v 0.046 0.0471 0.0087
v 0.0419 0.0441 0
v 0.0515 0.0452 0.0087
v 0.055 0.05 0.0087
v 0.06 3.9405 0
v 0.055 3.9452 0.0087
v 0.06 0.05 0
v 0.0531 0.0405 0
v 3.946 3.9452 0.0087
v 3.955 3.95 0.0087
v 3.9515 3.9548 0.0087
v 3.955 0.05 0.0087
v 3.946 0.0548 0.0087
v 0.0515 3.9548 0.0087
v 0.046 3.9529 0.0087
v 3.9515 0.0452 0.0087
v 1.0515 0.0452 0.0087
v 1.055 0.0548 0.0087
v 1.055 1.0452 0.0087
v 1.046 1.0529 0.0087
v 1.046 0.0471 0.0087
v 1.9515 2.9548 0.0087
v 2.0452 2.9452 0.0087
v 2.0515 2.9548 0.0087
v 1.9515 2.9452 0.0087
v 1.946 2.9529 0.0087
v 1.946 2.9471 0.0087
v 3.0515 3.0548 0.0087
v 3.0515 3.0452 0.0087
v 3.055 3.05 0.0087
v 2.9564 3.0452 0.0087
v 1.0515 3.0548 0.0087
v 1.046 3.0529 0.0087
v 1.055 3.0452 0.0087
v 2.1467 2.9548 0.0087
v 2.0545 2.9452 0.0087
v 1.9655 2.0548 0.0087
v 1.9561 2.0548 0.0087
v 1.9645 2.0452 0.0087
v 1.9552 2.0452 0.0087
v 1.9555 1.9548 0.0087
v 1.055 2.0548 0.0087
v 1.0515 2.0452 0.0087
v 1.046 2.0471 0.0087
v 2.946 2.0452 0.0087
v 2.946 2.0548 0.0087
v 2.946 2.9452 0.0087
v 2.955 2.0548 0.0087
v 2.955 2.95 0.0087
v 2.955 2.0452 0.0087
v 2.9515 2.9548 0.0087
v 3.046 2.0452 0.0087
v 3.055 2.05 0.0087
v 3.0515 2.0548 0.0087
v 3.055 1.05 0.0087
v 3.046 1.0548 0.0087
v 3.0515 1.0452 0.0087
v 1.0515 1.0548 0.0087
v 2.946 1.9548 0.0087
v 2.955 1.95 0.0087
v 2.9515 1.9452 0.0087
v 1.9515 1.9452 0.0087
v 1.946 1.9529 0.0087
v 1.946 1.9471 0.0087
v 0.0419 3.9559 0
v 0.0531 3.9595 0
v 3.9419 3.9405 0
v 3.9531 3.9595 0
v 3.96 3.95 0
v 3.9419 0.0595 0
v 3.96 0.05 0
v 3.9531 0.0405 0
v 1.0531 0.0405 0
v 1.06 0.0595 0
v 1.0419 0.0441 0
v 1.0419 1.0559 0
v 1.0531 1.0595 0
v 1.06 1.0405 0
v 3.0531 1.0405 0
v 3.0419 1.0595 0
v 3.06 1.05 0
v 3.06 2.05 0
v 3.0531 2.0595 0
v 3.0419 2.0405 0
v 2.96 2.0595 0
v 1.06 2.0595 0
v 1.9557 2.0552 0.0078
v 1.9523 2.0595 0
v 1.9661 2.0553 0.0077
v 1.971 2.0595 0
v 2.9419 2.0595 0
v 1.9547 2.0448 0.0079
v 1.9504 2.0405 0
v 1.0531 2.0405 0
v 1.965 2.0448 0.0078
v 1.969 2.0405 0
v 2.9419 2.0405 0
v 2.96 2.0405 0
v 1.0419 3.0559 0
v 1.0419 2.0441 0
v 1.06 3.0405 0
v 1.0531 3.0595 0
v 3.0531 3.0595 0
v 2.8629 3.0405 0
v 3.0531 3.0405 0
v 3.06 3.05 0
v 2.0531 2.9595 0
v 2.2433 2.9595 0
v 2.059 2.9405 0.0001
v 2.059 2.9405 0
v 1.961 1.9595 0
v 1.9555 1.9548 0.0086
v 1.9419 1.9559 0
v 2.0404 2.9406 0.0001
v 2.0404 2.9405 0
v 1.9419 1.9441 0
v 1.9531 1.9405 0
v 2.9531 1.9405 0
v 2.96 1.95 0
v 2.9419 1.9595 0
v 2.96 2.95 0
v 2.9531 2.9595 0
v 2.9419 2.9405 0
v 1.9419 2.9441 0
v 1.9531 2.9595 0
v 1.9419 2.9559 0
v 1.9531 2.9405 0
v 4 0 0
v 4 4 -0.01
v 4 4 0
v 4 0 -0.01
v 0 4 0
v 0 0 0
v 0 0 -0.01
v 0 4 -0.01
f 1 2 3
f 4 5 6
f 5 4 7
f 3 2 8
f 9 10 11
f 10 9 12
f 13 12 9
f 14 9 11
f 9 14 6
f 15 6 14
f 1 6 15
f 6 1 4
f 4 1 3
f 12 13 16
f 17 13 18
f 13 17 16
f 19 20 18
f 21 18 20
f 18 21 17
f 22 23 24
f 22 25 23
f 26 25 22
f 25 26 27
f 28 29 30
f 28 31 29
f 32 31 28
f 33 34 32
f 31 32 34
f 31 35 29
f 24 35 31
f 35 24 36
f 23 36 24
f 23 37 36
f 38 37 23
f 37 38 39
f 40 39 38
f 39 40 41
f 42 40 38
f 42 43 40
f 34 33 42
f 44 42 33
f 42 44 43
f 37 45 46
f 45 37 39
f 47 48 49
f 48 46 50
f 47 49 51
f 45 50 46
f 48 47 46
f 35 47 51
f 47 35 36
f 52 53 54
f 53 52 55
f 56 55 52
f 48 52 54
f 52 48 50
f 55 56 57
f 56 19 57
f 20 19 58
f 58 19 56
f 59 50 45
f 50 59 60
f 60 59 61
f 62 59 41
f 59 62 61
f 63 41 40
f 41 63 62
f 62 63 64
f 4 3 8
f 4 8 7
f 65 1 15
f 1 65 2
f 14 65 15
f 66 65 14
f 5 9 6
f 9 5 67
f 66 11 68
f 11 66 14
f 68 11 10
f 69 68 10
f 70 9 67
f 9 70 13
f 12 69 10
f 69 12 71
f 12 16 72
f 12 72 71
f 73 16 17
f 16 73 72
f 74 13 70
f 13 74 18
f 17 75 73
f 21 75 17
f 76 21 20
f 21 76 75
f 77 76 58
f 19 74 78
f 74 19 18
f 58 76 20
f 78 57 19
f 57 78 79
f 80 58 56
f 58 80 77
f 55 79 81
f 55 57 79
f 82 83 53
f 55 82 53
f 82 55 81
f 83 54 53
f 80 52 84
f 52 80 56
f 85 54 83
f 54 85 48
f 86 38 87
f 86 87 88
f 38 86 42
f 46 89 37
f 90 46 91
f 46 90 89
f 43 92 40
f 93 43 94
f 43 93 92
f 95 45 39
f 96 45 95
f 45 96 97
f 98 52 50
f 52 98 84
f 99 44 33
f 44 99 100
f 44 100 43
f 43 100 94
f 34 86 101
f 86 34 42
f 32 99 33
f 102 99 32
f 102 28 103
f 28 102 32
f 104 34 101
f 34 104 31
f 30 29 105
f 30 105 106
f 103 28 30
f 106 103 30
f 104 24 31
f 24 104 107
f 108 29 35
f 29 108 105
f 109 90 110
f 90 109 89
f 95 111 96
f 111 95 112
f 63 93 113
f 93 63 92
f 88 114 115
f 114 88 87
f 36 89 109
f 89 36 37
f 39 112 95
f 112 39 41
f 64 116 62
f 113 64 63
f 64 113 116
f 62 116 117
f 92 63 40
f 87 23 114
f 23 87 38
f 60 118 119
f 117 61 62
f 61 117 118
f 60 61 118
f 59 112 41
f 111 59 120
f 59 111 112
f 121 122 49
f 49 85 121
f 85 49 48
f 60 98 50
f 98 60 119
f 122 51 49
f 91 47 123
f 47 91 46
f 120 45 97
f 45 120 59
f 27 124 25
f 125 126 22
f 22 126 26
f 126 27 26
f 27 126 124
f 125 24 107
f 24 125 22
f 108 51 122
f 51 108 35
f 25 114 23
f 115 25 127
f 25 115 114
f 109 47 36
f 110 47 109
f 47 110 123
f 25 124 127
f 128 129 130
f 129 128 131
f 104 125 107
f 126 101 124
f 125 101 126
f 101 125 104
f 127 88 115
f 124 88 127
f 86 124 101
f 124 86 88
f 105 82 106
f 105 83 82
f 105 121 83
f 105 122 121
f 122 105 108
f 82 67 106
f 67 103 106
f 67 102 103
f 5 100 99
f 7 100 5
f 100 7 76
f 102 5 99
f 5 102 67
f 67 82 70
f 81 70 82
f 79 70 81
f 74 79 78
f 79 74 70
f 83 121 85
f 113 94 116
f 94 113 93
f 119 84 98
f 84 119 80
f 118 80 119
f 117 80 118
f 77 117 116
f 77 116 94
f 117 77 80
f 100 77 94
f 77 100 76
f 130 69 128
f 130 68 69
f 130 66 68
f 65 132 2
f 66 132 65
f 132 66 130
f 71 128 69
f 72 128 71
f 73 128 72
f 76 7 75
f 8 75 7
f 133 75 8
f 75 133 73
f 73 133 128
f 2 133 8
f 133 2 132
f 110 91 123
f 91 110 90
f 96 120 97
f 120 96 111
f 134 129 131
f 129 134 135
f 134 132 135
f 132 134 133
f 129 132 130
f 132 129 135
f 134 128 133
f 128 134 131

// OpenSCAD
hull(){
    translate([0.05, 0.05]) sphere(0.01);
    translate([0.05, 1.05]) sphere(0.01);
}
hull(){
    translate([0.05, 1.05]) sphere(0.01);
    translate([0.05, 2.05]) sphere(0.01);
}
hull(){
    translate([0.05, 2.05]) sphere(0.01);
    translate([0.05, 3.05]) sphere(0.01);
}
hull(){
    translate([0.05, 3.05]) sphere(0.01);
    translate([0.05, 3.95]) sphere(0.01);
}
hull(){
    translate([0.05, 3.95]) sphere(0.01);
    translate([1.05, 3.95]) sphere(0.01);
}
hull(){
    translate([1.05, 3.95]) sphere(0.01);
    translate([2.05, 3.95]) sphere(0.01);
}
hull(){
    translate([2.05, 3.95]) sphere(0.01);
    translate([3.05, 3.95]) sphere(0.01);
}
hull(){
    translate([3.05, 3.95]) sphere(0.01);
    translate([3.95, 3.95]) sphere(0.01);
}
hull(){
    translate([3.95, 3.95]) sphere(0.01);
    translate([3.95, 2.95]) sphere(0.01);
}
hull(){
    translate([3.95, 2.95]) sphere(0.01);
    translate([3.95, 1.95]) sphere(0.01);
}
hull(){
    translate([3.95, 1.95]) sphere(0.01);
    translate([3.95, 0.95]) sphere(0.01);
}
hull(){
    translate([3.95, 0.95]) sphere(0.01);
    translate([3.95, 0.05]) sphere(0.01);
}
hull(){
    translate([3.95, 0.05]) sphere(0.01);
    translate([2.95, 0.05]) sphere(0.01);
}
hull(){
    translate([2.95, 0.05]) sphere(0.01);
    translate([1.95, 0.05]) sphere(0.01);
}
hull(){
    translate([1.95, 0.05]) sphere(0.01);
    translate([1.05, 0.05]) sphere(0.01);
}
hull(){
    translate([1.05, 0.05]) sphere(0.01);
    translate([1.05, 1.05]) sphere(0.01);
}
hull(){
    translate([1.05, 1.05]) sphere(0.01);
    translate([2.05, 1.05]) sphere(0.01);
}
hull(){
    translate([2.05, 1.05]) sphere(0.01);
    translate([3.05, 1.05]) sphere(0.01);
}
hull(){
    translate([3.05, 1.05]) sphere(0.01);
    translate([3.05, 2.05]) sphere(0.01);
}
hull(){
    translate([3.05, 2.05]) sphere(0.01);
    translate([2.05, 2.05]) sphere(0.01);
}
hull(){
    translate([2.05, 2.05]) sphere(0.01);
    translate([1.05, 2.05]) sphere(0.01);
}
hull(){
    translate([1.05, 2.05]) sphere(0.01);
    translate([1.05, 3.05]) sphere(0.01);
}
hull(){
    translate([1.05, 3.05]) sphere(0.01);
    translate([2.05, 3.05]) sphere(0.01);
}
hull(){
    translate([2.05, 3.05]) sphere(0.01);
    translate([3.05, 3.05]) sphere(0.01);
}
hull(){
    translate([3.05, 3.05]) sphere(0.01);
    translate([2.05, 2.95]) sphere(0.01);
}
hull(){
    translate([2.05, 2.95]) sphere(0.01);
    translate([1.95, 1.95]) sphere(0.01);
}
hull(){
    translate([1.95, 1.95]) sphere(0.01);
    translate([2.95, 1.95]) sphere(0.01);
}
hull(){
    translate([2.95, 1.95]) sphere(0.01);
    translate([2.95, 2.95]) sphere(0.01);
}
hull(){
    translate([2.95, 2.95]) sphere(0.01);
    translate([1.95, 2.95]) sphere(0.01);
}
translate([0,0,-0.01]) color([0.1,0.1,0.1]) cube([4,4,0.01]);
